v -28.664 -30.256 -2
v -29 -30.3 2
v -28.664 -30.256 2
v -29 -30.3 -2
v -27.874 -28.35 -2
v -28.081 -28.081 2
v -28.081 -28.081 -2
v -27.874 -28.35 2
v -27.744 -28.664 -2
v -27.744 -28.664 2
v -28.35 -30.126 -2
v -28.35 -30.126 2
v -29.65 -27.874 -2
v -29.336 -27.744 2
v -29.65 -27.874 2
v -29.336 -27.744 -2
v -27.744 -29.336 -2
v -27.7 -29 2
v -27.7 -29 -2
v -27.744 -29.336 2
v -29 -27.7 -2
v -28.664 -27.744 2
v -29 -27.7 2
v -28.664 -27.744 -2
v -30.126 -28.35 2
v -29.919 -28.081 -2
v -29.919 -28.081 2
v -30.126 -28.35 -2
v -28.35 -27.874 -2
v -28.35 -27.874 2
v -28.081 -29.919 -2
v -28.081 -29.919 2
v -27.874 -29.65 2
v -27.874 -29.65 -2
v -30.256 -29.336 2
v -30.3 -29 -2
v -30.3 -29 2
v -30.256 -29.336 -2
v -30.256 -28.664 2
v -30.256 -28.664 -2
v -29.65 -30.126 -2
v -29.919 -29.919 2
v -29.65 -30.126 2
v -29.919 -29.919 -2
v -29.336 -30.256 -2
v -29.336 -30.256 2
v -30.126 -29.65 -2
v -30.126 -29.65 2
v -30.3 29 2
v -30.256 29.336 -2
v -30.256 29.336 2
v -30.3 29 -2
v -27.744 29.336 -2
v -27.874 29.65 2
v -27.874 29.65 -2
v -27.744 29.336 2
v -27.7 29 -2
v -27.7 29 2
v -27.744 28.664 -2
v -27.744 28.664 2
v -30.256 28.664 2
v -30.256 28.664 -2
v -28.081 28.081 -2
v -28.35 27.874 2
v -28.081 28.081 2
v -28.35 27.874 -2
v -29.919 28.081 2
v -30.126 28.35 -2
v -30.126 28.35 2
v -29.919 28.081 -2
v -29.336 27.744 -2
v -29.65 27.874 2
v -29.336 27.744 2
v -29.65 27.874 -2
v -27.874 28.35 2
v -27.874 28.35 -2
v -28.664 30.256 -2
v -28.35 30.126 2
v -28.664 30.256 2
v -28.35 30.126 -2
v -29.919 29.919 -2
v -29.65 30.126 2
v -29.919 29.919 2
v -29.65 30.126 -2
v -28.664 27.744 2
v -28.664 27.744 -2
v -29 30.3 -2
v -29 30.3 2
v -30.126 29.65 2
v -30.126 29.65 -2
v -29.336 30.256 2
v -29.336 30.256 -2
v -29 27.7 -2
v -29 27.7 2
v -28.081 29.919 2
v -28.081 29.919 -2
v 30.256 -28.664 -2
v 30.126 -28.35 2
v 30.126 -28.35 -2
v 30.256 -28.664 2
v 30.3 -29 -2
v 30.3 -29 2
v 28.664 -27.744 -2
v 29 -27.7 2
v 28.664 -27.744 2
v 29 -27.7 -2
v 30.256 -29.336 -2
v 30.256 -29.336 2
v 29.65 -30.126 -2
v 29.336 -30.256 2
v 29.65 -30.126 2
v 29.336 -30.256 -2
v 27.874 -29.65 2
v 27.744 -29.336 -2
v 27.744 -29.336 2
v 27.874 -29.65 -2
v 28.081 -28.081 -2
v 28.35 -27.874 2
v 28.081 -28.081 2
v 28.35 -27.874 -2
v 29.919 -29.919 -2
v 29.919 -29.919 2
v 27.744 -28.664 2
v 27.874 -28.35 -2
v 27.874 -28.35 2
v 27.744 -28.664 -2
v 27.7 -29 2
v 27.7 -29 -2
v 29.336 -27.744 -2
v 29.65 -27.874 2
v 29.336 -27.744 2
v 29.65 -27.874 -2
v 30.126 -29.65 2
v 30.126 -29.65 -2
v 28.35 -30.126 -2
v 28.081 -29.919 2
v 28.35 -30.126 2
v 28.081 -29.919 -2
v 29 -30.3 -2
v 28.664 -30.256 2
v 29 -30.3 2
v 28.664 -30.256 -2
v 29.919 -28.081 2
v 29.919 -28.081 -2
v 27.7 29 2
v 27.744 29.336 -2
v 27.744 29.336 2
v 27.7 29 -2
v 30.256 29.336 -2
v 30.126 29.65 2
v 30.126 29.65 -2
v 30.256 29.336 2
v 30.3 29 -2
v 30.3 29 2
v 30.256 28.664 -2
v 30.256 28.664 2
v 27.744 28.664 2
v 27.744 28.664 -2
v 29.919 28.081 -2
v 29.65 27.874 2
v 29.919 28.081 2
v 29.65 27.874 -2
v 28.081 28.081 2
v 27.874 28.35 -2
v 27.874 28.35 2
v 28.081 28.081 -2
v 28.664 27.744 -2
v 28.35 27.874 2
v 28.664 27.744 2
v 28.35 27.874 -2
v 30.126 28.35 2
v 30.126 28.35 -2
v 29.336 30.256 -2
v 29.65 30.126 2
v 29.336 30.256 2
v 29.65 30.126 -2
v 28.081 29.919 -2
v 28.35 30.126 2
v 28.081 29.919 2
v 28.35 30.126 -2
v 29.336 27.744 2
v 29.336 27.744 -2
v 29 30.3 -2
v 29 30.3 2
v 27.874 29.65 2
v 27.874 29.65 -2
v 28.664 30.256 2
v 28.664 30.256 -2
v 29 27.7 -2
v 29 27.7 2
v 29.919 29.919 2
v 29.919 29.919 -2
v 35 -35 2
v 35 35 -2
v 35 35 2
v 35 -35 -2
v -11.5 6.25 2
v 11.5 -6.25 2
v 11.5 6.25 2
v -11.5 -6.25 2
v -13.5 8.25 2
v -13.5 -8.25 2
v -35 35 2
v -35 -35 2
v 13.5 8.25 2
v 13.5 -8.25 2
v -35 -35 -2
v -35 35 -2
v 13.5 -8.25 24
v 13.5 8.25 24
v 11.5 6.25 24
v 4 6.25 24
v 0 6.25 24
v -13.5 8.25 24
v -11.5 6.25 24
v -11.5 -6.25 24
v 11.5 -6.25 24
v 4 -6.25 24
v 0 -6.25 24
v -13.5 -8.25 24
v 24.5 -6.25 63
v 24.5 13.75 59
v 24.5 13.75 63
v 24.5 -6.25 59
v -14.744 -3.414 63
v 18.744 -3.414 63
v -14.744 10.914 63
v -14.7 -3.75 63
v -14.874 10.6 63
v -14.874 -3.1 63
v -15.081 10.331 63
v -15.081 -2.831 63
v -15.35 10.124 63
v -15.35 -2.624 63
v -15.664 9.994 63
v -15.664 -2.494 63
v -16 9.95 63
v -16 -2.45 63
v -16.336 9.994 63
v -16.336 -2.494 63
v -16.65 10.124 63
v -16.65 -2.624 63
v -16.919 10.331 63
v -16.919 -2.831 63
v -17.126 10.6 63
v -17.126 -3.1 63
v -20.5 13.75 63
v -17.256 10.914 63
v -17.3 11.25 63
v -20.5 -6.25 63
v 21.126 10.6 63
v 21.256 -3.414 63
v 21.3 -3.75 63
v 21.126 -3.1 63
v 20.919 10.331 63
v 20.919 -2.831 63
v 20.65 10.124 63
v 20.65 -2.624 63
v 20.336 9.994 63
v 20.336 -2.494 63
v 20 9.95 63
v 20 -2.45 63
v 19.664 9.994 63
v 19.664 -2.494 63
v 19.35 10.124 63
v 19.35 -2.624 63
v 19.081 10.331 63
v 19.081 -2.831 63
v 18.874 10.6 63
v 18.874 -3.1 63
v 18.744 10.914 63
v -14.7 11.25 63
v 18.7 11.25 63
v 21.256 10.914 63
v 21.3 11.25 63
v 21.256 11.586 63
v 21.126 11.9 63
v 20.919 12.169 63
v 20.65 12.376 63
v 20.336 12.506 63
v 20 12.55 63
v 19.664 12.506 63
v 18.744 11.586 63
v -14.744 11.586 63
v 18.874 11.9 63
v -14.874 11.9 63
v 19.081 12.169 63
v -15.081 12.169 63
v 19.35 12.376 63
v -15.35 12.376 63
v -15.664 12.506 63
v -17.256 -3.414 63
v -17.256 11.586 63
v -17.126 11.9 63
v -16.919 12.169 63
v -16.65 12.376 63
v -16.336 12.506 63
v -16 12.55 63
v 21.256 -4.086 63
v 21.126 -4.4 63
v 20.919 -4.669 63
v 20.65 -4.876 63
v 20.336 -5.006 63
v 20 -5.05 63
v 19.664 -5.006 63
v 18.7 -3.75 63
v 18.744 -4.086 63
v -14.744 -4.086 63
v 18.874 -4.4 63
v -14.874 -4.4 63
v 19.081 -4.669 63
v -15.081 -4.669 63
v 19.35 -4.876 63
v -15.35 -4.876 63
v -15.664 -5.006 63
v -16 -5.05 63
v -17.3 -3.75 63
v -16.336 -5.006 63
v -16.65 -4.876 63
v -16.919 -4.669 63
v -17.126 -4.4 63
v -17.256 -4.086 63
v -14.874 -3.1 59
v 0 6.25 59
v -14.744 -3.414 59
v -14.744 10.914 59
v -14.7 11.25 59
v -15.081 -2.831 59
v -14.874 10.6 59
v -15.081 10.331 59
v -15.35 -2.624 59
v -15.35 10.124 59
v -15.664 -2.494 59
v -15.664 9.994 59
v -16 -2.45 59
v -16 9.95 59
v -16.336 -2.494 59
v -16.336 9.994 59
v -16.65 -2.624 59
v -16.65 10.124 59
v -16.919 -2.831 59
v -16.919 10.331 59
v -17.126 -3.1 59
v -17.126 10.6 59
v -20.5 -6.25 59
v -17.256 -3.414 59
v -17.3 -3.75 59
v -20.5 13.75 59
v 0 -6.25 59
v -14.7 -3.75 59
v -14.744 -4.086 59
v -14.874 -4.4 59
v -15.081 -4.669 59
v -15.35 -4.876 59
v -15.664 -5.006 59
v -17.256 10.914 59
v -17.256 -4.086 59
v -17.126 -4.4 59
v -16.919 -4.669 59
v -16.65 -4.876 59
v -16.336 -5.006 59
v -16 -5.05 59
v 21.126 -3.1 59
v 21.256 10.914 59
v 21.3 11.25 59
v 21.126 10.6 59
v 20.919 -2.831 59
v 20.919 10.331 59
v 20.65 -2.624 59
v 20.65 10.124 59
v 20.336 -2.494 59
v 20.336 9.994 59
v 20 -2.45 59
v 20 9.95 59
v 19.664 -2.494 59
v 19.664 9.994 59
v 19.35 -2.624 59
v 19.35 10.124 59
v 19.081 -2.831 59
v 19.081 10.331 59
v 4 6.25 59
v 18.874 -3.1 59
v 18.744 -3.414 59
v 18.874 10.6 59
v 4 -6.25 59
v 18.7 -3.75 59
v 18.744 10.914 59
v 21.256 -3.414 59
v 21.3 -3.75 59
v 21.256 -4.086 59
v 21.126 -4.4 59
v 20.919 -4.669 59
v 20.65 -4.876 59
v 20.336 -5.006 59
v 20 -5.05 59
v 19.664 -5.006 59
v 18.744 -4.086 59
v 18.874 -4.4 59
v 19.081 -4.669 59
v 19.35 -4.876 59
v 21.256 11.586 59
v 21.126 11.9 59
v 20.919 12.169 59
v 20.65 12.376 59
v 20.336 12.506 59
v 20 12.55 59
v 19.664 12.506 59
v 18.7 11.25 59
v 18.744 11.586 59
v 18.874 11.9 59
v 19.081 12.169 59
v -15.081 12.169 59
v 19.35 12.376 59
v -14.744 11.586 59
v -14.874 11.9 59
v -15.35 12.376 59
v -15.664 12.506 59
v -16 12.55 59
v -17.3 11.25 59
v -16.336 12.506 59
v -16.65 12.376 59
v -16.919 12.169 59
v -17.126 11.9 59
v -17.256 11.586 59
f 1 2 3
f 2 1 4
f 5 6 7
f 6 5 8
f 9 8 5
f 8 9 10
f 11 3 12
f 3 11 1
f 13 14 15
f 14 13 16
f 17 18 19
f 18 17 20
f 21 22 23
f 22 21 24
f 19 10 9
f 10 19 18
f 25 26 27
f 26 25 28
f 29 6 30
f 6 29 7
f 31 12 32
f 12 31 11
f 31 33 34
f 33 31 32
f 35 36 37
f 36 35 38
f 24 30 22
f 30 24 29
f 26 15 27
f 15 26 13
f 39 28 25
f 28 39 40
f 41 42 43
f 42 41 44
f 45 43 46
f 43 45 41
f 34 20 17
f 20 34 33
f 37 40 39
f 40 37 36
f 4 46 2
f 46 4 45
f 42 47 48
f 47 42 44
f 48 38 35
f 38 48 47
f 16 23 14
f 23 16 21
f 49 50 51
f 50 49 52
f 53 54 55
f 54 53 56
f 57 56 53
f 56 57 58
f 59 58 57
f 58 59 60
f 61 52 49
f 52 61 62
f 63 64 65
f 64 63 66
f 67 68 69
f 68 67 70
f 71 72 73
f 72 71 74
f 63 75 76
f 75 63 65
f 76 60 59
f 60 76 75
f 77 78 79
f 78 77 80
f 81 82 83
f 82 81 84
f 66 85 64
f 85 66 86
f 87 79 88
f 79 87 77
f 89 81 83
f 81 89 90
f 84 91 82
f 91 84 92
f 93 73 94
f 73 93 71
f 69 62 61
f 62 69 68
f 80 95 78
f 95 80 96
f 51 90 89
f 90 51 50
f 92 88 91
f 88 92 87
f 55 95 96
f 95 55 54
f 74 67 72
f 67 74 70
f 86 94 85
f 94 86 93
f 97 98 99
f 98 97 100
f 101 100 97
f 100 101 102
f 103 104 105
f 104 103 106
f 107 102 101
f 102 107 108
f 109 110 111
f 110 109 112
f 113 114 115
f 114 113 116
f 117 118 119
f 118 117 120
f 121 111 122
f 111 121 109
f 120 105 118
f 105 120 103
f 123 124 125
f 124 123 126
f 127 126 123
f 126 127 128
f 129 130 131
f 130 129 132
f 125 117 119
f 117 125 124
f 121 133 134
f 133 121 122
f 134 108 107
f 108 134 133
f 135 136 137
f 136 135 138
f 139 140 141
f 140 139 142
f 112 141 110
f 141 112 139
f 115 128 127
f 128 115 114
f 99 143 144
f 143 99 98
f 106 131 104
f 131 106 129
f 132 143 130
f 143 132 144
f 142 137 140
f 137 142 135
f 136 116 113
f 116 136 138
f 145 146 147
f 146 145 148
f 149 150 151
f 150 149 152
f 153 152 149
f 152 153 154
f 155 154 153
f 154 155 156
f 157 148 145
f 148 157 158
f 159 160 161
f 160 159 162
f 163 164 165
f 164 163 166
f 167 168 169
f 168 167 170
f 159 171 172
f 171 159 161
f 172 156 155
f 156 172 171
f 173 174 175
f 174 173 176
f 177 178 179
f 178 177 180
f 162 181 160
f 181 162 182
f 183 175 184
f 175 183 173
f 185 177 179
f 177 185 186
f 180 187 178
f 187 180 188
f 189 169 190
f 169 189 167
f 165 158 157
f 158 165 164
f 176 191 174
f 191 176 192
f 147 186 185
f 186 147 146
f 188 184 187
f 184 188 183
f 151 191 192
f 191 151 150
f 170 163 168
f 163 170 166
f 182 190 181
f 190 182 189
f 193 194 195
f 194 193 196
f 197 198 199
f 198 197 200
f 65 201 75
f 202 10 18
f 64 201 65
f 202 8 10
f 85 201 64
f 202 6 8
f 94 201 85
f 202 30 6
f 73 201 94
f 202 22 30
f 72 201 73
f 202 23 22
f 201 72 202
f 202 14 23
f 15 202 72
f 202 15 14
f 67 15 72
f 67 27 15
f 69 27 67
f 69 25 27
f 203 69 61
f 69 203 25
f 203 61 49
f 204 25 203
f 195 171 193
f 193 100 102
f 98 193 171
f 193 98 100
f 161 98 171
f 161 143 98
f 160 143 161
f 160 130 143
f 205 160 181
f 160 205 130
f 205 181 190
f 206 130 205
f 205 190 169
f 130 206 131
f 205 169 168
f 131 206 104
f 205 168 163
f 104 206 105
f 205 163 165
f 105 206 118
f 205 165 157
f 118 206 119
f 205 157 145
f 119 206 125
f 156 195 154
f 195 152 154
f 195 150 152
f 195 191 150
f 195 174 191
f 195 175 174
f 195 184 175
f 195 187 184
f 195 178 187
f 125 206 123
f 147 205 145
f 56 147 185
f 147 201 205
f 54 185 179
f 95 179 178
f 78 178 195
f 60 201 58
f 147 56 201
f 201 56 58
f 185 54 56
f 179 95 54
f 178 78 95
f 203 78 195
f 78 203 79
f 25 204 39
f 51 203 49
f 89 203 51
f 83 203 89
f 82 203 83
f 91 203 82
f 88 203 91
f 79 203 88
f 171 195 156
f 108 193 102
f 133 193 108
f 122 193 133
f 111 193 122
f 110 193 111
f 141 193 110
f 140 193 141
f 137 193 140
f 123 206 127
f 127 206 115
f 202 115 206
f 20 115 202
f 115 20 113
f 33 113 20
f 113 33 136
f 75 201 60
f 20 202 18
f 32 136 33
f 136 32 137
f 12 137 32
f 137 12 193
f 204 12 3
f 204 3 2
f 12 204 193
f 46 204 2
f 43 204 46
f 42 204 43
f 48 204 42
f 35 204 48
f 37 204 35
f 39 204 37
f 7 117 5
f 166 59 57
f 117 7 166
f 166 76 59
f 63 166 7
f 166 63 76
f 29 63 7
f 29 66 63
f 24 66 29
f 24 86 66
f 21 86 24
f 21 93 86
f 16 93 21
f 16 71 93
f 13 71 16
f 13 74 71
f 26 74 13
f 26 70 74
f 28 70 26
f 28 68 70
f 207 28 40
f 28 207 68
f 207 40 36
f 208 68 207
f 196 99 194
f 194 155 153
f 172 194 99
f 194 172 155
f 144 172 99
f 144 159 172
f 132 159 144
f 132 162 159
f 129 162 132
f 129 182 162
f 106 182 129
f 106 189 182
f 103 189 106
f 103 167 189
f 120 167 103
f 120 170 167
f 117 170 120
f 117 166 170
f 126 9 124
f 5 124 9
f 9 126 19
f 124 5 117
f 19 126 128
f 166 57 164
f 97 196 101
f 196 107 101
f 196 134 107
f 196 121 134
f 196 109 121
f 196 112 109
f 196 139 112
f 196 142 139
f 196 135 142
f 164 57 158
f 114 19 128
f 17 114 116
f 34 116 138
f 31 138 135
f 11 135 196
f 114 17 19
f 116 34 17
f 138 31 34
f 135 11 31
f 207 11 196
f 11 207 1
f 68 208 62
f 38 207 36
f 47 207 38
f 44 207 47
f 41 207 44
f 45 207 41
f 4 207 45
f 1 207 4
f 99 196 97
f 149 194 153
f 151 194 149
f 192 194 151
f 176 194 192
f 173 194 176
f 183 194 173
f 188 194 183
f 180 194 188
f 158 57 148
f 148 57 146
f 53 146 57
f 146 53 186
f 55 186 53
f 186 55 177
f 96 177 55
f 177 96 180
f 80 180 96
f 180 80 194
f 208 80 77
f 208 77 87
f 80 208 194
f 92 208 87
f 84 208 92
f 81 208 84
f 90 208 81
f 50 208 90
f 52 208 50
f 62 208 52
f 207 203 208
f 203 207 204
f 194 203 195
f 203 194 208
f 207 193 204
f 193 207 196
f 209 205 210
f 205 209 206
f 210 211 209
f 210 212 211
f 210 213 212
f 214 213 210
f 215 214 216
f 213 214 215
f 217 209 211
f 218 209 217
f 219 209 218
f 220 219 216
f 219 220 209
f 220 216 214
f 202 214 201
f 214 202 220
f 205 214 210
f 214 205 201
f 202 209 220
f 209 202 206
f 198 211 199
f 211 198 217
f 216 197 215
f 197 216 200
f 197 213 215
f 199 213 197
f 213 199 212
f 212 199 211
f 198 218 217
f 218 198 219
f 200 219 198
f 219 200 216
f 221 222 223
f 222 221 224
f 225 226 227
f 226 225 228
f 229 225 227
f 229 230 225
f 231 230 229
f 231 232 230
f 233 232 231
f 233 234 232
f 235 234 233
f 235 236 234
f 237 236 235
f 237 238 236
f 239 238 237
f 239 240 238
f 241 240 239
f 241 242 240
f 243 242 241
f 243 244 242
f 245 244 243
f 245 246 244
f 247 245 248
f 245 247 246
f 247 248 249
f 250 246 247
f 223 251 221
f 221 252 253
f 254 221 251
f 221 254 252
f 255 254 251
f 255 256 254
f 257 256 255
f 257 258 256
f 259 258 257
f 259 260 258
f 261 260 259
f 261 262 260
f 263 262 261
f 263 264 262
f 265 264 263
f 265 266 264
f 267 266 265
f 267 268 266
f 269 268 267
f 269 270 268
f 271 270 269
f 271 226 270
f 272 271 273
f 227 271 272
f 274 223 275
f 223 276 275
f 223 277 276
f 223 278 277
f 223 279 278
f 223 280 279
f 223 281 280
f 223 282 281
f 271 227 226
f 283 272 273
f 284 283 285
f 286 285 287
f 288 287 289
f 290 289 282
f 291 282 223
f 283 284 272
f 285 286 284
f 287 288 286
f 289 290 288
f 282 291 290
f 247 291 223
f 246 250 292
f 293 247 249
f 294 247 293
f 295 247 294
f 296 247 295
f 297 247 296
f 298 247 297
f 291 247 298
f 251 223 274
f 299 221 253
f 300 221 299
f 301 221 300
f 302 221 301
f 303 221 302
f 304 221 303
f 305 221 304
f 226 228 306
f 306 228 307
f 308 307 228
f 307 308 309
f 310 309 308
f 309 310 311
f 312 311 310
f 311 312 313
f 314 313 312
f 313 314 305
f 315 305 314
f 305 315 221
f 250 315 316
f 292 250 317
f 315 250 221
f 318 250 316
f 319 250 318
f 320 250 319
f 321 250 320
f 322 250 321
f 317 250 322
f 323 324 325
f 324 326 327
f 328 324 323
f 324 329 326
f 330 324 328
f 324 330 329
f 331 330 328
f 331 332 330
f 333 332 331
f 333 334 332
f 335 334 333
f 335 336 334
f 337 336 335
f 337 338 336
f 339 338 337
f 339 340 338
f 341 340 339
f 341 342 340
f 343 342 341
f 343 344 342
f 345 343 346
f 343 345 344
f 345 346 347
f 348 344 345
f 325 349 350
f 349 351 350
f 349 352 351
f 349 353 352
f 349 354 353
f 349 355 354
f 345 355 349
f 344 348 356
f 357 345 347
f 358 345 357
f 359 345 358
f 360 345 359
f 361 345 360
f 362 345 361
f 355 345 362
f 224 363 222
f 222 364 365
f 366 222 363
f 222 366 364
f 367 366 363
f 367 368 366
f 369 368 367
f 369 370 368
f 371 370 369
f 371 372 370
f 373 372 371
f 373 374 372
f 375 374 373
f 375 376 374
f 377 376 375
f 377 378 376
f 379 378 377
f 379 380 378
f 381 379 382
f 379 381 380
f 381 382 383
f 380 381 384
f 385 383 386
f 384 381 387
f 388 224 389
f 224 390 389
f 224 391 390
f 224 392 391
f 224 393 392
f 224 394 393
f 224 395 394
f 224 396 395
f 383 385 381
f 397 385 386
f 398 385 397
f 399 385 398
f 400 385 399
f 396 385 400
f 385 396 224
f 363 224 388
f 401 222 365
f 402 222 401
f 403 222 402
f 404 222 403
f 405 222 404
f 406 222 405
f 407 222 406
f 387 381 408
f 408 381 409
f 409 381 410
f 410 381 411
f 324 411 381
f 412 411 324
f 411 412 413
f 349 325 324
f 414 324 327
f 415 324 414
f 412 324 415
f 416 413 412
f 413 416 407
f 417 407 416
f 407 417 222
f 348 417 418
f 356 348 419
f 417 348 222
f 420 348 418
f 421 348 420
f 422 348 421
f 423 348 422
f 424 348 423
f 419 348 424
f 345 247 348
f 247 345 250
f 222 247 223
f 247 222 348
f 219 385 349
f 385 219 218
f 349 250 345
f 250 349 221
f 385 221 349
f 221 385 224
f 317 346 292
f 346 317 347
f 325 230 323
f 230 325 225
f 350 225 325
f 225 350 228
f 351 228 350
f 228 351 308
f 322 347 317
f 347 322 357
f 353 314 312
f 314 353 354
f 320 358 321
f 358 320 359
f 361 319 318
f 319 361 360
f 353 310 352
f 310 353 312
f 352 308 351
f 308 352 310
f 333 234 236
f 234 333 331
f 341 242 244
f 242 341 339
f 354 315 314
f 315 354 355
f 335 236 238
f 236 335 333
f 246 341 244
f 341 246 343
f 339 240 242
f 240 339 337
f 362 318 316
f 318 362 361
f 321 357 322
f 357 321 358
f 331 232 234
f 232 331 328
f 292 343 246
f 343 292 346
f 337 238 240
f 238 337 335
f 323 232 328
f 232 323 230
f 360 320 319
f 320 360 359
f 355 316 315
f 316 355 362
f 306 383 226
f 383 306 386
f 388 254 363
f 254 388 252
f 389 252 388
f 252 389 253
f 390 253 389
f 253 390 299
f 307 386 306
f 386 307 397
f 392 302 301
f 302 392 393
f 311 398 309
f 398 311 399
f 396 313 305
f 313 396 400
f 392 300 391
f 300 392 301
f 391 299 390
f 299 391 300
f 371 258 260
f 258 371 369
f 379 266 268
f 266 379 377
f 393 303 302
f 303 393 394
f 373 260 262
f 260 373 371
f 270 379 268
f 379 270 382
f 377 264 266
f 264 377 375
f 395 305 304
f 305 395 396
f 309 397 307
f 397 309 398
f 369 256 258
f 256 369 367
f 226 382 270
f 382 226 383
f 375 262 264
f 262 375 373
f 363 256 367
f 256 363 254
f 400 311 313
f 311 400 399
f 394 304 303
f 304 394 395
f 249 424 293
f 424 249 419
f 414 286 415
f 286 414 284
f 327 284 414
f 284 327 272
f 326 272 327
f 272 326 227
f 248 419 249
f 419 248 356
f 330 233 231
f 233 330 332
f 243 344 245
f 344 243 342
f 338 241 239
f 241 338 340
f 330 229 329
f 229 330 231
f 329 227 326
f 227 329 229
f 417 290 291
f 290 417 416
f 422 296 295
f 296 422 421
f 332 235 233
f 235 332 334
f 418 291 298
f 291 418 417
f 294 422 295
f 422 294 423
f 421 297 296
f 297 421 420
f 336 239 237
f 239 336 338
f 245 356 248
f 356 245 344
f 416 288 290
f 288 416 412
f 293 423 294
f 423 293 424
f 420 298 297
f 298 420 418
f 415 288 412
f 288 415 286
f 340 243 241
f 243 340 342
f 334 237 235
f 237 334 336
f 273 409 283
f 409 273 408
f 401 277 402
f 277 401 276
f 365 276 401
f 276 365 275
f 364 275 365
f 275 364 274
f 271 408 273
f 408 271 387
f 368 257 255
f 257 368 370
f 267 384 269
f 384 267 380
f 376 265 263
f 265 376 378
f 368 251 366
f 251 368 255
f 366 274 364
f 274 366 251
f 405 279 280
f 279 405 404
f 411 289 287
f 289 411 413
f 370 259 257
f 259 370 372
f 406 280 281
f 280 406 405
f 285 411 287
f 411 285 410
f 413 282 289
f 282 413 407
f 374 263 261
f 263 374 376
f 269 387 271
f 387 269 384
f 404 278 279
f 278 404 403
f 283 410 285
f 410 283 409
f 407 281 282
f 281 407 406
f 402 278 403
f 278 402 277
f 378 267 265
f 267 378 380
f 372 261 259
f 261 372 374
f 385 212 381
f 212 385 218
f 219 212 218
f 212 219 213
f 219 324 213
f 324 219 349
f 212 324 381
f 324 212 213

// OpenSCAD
// EchoSentinel — Servo/HC-SR04 Radar Mount
// Parametric OpenSCAD design. Open in OpenSCAD (openscad.org), tweak
// the parameters below, render (F6), export to STL for printing.

// ---- Parameters ----
base_w = 70;
base_d = 70;
base_h = 4;

servo_body_w = 23;
servo_body_d = 12.5;
servo_body_h = 22;
servo_wall = 2;

sensor_w = 45;
sensor_h = 20;
sensor_hole_spacing_x = 36;
sensor_hole_spacing_y = 15;
sensor_mount_h = 35;      // height of sensor arm above servo horn
arm_thickness = 4;

mount_hole_d = 2.6;       // M2.5 self-tap

// ---- Base plate with mounting holes ----
module base_plate() {
  difference() {
    cube([base_w, base_d, base_h], center = true);
    for (x = [-1, 1]) {
      for (y = [-1, 1]) {
        translate([x * (base_w/2 - 6), y * (base_d/2 - 6), 0])
          cylinder(h = base_h * 3, d = mount_hole_d, center = true, $fn = 24);
      }
    }
  }
}

// ---- Servo cradle (SG90-size) ----
module servo_cradle() {
  translate([0, 0, base_h/2])
    difference() {
      cube([servo_body_w + servo_wall*2, servo_body_d + servo_wall*2, servo_body_h],
           center = false);
      translate([servo_wall, servo_wall, -1])
        cube([servo_body_w, servo_body_d, servo_body_h + 2]);
    }
}

// ---- Sensor arm that attaches to the servo horn and holds the HC-SR04 ----
module sensor_arm() {
  translate([0, 0, base_h/2 + servo_body_h])
    union() {
      // vertical riser
      cube([arm_thickness, servo_body_d, sensor_mount_h], center = false);

      // horizontal sensor plate at top
      translate([-(sensor_w - arm_thickness)/2, 0, sensor_mount_h])
        difference() {
          cube([sensor_w, sensor_h, arm_thickness]);
          translate([(sensor_w - sensor_hole_spacing_x)/2,
                     (sensor_h - sensor_hole_spacing_y)/2, -1])
            cylinder(h = arm_thickness + 2, d = mount_hole_d, $fn = 24);
          translate([(sensor_w - sensor_hole_spacing_x)/2 + sensor_hole_spacing_x,
                     (sensor_h - sensor_hole_spacing_y)/2, -1])
            cylinder(h = arm_thickness + 2, d = mount_hole_d, $fn = 24);
          translate([(sensor_w - sensor_hole_spacing_x)/2,
                     (sensor_h - sensor_hole_spacing_y)/2 + sensor_hole_spacing_y, -1])
            cylinder(h = arm_thickness + 2, d = mount_hole_d, $fn = 24);
          translate([(sensor_w - sensor_hole_spacing_x)/2 + sensor_hole_spacing_x,
                     (sensor_h - sensor_hole_spacing_y)/2 + sensor_hole_spacing_y, -1])
            cylinder(h = arm_thickness + 2, d = mount_hole_d, $fn = 24);
        }
    }
}

module echo_sentinel_mount() {
  base_plate();
  translate([-(servo_body_w + servo_wall*2)/2, -(servo_body_d + servo_wall*2)/2, 0])
    servo_cradle();
  translate([0, -servo_body_d/2, 0])
    sensor_arm();
}

echo_sentinel_mount();
